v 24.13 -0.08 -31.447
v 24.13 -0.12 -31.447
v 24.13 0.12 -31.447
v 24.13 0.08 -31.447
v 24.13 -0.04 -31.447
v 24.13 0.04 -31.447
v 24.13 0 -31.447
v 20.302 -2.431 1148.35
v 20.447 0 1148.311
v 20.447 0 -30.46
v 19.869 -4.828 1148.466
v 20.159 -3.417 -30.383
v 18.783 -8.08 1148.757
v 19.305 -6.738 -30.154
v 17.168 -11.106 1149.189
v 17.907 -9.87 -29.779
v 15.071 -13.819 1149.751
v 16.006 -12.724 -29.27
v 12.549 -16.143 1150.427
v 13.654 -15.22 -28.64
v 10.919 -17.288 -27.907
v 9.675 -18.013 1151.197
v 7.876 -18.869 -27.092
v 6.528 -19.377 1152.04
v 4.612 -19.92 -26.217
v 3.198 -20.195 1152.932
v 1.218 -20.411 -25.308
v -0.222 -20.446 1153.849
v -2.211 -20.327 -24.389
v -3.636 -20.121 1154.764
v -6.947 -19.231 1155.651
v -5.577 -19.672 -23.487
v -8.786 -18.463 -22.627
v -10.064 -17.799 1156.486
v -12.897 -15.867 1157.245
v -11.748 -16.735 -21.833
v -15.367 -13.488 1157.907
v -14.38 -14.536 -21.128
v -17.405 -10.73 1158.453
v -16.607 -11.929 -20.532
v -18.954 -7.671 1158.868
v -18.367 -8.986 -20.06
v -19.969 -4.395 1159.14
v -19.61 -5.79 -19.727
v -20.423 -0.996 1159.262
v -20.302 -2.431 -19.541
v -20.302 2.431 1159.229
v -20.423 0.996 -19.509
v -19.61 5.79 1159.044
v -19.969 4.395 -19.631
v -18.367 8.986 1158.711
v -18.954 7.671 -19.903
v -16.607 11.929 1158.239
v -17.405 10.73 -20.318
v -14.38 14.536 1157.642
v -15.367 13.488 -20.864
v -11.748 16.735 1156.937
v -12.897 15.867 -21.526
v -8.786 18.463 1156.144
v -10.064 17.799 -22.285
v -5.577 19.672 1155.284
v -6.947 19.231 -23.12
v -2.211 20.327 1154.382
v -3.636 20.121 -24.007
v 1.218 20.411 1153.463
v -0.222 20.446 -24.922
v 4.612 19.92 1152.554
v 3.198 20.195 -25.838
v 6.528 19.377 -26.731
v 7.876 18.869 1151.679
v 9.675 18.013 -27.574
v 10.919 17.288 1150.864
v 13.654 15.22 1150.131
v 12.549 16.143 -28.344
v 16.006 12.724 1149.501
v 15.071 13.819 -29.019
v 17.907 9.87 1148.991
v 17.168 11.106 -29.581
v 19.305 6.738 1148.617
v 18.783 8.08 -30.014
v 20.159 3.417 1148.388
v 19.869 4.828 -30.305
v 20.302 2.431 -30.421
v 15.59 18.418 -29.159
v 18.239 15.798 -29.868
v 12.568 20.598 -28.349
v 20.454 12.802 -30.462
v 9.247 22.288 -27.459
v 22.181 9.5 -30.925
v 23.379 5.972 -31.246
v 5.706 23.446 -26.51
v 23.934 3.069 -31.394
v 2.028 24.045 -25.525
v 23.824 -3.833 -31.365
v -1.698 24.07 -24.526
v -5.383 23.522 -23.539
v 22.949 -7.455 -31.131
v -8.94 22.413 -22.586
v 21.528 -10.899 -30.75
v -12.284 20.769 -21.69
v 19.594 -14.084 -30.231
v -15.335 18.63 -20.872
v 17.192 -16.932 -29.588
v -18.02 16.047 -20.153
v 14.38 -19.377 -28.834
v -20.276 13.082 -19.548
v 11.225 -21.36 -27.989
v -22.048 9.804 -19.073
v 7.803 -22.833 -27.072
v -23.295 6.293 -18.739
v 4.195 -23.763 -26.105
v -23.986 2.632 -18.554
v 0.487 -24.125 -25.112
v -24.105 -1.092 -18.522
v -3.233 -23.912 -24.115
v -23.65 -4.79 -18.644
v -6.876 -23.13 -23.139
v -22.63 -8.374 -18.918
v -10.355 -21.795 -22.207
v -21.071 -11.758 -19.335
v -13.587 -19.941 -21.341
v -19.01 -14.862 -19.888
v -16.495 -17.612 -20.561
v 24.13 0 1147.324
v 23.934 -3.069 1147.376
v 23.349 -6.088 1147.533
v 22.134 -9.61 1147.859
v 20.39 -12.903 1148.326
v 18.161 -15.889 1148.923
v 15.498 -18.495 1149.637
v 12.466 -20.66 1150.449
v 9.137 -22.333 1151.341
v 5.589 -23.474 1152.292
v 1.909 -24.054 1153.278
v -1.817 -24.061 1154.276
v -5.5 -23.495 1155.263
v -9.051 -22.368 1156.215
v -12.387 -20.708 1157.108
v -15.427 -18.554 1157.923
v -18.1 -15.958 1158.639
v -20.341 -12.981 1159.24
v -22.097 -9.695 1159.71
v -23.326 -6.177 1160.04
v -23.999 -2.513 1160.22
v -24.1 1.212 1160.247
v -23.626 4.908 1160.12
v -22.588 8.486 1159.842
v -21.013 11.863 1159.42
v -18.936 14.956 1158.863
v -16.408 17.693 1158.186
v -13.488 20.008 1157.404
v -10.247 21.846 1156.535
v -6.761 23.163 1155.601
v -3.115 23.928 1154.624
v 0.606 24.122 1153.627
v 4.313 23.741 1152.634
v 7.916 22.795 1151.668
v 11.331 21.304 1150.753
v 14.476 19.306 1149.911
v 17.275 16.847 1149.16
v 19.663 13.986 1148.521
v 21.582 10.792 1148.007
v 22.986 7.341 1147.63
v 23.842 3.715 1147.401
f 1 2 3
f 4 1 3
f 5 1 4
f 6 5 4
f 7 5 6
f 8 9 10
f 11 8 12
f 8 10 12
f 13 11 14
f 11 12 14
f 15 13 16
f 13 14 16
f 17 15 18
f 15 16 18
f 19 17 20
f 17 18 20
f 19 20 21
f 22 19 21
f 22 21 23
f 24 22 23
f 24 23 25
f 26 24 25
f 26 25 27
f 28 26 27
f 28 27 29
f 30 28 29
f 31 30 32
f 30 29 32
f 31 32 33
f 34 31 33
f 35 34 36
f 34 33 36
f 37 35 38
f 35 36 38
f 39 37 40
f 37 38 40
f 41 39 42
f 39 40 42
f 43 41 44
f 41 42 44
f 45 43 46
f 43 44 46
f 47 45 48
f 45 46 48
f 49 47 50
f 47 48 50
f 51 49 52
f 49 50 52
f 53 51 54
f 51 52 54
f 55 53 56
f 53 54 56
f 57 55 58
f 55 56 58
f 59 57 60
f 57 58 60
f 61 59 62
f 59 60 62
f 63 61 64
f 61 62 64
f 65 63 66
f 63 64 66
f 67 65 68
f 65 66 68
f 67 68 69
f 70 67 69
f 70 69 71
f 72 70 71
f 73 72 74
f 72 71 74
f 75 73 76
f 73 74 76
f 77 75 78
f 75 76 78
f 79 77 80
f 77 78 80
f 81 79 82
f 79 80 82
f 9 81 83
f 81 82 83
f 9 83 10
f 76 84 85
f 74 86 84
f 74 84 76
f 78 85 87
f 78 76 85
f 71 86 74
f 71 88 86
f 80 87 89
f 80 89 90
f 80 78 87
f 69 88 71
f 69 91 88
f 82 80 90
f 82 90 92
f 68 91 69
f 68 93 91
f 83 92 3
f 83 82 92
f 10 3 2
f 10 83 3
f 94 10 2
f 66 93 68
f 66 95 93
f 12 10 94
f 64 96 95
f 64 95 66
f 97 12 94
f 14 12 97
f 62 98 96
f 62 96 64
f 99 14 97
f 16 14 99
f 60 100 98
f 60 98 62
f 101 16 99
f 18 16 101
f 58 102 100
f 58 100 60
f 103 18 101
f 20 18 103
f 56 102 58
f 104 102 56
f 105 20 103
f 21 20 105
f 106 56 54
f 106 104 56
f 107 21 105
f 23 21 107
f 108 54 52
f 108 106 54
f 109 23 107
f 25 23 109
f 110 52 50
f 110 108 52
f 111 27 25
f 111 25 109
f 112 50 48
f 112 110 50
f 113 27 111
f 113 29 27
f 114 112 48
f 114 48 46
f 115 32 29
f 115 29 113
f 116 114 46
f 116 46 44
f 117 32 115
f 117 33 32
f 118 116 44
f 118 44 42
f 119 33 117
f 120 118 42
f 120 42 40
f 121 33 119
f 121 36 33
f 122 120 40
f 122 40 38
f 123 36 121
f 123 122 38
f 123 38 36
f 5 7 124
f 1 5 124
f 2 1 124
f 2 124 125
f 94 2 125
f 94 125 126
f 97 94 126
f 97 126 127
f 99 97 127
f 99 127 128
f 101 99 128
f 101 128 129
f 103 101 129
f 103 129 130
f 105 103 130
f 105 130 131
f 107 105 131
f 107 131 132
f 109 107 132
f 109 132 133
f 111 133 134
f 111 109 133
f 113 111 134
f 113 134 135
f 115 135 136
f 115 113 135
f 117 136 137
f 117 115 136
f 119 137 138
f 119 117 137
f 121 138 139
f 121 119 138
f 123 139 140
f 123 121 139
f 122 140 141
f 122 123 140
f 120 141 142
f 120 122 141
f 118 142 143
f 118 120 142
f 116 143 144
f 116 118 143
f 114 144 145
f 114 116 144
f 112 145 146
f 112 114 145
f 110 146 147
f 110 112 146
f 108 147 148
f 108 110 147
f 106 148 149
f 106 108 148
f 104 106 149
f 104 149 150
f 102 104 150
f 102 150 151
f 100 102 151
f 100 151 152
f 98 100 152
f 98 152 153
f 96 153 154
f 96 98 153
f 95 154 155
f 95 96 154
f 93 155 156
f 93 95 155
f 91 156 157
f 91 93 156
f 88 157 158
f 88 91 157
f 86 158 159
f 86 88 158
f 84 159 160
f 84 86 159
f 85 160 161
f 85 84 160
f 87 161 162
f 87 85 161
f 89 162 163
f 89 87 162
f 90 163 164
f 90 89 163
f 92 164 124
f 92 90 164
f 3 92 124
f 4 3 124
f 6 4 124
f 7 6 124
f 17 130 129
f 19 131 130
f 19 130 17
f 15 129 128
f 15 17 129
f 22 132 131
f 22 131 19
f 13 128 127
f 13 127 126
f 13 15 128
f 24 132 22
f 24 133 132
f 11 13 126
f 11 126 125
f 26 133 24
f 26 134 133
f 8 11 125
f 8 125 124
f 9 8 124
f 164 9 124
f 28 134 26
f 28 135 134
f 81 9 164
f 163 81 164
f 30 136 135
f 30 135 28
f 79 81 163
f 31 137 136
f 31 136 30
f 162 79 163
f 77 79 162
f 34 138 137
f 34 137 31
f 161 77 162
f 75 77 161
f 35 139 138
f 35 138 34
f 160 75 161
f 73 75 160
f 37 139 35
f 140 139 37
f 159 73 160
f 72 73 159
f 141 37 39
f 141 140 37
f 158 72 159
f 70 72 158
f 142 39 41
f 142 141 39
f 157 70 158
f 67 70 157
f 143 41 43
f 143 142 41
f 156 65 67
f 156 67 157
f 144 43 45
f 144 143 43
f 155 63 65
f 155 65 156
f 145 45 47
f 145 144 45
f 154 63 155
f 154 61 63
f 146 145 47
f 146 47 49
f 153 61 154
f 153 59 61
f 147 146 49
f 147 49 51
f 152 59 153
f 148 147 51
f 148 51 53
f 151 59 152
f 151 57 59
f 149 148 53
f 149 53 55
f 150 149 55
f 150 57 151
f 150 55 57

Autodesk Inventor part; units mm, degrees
ref_plane "Start Plane" through (0, 0, -31.4468) normal (0, 0, 1) x (1, 0, 0)
ref_plane "End Plane" through (0, 0, 1160.255) normal (0, 0, 1) x (1, 0, 0)
sketch "Sketch" plane through (0, 0, 0) normal (0, 0, 1) x (1, 0, 0)
  circle A0 centre (0, 0) radius 20.447
  circle A1 centre (0, 0) radius 24.13
  dimension "d0" = 48.26
  dimension "d1" = 3.683
extrude "Body" add sketch "Sketch" along normal up to surface (1191.7019 mm away) from surface at -31.4468
sketch "Sketch3" plane through (0, 0, 0) normal (0, 0, 1) x (1, 0, 0)
  line L0 (0, 0) -> (10, 0)
ref_plane "Work Plane3" through (0, 0, 0) normal (0, -1, 0) x (1, 0, 0)
ref_plane "Work Plane4" through (-6.5041, 0, 1155.5322) normal (0.2588, 0, 0.9659) x (0.9659, 0, -0.2588)
split "Split1" plane through (-6.5041, 0, 1155.5322) removes the side toward (0.2588, 0, 0.9659)
ref_plane "Work Plane5" through (-982.5186, 0, 238.2838) normal (-0.2588, 0, -0.9659) x (-0.9659, 0, 0.2588)
split "Split2" plane through (-982.5186, 0, 238.2838) removes the side toward (-0.2588, 0, -0.9659)
sketch "Sketch4" plane through (0, 0, 0) normal (0, -1, 0) x (1, 0, 0)
  line L0 (-2, -31.4468) -> (12, -31.4468) projected
  line L1 (-2, 1160.255) -> (12, 1160.255) projected
  dimension "d7" = 1191.7018
equation "\"d0\" = G_H"
equation "\"d1\" = G_T"
equation "\"d2\" = G_L"
equation "\"G_H\" = 48.26"
equation "\"G_T\" = 3.683"
equation "\"G_L\" = d7"
equation "\"G_OFFSET_START\" = 31.44683"
equation "\"G_OFFSET_END\" = -19.55088"
equation "\"d4\" = -G_OFFSET_START"
equation "\"d5\" = G_OFFSET_END + B_L"
equation "\"B_L\" = 1179.8059"
properties part number "ANSI - 1 1/2 x 0.145 - 46.917" material "Steel, Mild"
